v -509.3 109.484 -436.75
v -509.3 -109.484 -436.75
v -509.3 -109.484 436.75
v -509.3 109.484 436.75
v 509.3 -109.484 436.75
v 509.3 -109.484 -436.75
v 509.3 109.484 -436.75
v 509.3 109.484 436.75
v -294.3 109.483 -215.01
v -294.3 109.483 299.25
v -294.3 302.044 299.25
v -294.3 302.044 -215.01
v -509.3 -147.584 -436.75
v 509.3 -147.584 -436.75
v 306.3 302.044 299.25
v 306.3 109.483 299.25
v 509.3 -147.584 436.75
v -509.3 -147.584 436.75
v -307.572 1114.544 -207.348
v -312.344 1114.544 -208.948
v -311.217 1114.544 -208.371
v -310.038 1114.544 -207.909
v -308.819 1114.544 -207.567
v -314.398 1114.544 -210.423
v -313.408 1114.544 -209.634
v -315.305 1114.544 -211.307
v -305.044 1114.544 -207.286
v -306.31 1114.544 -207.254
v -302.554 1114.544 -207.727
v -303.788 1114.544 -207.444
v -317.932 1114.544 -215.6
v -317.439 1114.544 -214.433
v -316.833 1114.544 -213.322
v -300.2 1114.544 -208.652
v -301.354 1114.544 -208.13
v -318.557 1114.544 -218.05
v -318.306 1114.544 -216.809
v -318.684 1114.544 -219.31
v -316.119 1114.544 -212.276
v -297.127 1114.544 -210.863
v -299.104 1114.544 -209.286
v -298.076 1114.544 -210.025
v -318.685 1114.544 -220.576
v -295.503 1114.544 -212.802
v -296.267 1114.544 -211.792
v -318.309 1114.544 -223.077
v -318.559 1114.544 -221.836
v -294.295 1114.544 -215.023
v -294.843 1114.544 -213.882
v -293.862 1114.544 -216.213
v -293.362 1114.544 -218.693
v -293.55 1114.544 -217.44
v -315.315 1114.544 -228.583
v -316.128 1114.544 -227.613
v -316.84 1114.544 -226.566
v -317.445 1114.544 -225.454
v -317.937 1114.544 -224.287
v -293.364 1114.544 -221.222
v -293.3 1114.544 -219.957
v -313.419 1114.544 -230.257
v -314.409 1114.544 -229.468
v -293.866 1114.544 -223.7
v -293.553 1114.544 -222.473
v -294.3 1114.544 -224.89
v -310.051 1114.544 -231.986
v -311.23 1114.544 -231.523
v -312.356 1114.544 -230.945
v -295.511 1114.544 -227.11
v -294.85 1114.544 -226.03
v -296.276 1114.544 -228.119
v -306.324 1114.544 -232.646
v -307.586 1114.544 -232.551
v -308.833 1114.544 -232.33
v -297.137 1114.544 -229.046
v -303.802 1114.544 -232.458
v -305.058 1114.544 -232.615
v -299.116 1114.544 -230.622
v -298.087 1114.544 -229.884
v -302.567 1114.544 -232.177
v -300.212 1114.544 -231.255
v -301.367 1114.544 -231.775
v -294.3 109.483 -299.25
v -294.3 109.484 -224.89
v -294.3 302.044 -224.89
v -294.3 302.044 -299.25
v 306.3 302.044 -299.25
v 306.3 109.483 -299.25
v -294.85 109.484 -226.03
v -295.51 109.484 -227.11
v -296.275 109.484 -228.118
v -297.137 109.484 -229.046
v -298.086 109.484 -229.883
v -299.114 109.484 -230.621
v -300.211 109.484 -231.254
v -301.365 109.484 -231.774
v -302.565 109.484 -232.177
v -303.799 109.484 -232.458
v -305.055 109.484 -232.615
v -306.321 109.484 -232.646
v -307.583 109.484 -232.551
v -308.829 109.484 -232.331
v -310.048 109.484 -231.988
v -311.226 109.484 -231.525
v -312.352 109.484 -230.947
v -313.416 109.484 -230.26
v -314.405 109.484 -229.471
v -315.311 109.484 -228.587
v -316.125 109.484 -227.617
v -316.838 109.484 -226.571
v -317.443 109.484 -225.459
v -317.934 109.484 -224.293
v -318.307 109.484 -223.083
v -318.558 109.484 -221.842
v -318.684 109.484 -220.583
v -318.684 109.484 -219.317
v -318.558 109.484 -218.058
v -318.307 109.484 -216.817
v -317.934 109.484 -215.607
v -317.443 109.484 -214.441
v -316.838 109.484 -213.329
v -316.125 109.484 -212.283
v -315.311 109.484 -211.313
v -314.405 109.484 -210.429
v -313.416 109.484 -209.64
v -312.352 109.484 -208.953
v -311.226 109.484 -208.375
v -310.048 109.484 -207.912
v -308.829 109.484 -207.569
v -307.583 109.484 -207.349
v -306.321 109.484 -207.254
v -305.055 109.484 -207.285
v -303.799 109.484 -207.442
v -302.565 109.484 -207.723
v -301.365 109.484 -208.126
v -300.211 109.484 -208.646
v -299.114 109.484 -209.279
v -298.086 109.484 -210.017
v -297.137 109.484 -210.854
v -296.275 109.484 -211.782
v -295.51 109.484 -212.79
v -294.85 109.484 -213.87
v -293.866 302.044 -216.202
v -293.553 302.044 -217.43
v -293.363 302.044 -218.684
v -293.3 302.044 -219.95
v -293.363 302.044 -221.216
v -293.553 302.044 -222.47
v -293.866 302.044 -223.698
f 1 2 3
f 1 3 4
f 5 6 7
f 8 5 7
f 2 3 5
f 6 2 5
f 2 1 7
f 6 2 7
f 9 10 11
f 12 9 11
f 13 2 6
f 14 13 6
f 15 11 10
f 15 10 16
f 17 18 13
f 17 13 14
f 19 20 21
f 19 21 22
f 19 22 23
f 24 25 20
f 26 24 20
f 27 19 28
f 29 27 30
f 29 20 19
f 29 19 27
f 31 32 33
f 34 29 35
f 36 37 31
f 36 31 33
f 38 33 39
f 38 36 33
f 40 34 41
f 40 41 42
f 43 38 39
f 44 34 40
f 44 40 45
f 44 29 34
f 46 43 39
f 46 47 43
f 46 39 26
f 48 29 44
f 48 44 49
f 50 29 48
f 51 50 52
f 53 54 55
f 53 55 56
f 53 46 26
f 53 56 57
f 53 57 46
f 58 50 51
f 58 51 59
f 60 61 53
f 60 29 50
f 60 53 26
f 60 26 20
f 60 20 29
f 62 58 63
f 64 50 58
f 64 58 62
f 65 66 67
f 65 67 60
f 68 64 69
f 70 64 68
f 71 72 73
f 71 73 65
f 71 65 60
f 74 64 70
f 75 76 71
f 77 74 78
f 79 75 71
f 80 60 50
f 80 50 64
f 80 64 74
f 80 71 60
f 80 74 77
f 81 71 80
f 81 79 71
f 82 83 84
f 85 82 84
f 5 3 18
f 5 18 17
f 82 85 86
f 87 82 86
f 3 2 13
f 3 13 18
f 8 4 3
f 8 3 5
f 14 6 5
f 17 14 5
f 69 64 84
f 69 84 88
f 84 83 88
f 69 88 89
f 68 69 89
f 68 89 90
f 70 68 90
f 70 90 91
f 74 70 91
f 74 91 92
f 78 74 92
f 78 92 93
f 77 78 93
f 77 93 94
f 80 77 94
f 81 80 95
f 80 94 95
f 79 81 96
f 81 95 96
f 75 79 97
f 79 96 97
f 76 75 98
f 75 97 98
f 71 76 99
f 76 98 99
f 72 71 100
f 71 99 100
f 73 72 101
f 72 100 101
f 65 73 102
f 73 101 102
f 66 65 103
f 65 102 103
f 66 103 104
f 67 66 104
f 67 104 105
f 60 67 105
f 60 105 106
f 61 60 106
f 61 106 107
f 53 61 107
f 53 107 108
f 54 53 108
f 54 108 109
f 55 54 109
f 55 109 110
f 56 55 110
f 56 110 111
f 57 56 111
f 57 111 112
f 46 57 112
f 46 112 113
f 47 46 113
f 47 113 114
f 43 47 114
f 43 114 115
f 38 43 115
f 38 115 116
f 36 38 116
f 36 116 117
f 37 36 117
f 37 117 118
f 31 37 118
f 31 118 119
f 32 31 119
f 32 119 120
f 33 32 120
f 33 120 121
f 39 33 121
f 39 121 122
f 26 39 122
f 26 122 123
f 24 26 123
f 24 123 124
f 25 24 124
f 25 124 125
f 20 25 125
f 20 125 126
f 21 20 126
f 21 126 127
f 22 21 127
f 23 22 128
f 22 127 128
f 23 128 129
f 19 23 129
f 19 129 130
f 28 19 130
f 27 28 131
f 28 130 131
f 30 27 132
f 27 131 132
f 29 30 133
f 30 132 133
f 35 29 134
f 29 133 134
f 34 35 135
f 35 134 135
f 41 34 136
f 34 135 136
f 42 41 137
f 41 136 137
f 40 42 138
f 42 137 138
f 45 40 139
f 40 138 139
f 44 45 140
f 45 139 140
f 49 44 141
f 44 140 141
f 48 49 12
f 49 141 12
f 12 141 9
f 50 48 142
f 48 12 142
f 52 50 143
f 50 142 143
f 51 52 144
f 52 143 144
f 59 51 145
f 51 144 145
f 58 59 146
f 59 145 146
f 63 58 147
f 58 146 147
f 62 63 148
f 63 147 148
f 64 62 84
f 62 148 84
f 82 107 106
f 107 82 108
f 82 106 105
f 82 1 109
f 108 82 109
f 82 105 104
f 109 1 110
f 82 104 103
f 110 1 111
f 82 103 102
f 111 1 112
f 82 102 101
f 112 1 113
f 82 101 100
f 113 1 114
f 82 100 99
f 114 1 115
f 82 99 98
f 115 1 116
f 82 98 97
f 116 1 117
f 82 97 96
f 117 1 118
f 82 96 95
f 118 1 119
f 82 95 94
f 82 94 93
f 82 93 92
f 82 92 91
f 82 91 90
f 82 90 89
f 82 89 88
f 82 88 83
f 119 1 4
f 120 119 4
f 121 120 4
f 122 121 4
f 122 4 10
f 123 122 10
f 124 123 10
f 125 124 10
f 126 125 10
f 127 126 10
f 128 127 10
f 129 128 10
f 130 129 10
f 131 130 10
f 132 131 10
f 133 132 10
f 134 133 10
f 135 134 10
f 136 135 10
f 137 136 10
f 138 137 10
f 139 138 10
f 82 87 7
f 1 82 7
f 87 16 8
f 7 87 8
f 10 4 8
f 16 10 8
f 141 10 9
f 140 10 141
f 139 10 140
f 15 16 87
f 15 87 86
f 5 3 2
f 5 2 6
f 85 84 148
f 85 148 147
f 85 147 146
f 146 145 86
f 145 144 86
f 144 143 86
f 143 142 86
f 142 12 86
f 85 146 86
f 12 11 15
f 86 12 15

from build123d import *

# Parameters (mm, degrees)
SKETCH1_W           = 1018.6
SKETCH1_H           = 218.967
BOSS_EXTRUDE1_DEPTH = 436.75
SKETCH2_W           = 600.6
SKETCH2_H           = 192.56
BOSS_EXTRUDE2_DEPTH = 299.25
SKETCH3_R           = 12.7
BOSS_EXTRUDE5_DEPTH = 1005.06
SKETCH4_W           = 1018.6
SKETCH4_H           = 873.5
BOSS_EXTRUDE6_DEPTH = 38.1


with BuildPart() as part:
    # Sketch1 → Boss-Extrude1 (new, symmetric)
    with BuildSketch(Plane.XY):
        Rectangle(SKETCH1_W, SKETCH1_H)
    extrude(amount=BOSS_EXTRUDE1_DEPTH, both=True)

    # Sketch2 → Boss-Extrude2 (add, symmetric)
    with BuildSketch(Plane.XY):
        with Locations((6, 205.7635)):
            Rectangle(SKETCH2_W, SKETCH2_H)
    extrude(amount=BOSS_EXTRUDE2_DEPTH, both=True)

    # Sketch3 → Boss-Extrude5 (add)
    with BuildSketch(Plane(origin=(0, 109.4835, 0), x_dir=(1, 0, 0), z_dir=(0, 1, 0))):
        with Locations(Location((-306, 219.95, 0), (0, 0, 22.889037196))):
            Circle(SKETCH3_R)
    extrude(amount=BOSS_EXTRUDE5_DEPTH)


with BuildPart() as body_2:
    # Sketch4 → Boss-Extrude6 (new body)
    with BuildSketch(Plane.XZ.offset(109.4835)):
        Rectangle(SKETCH4_W, SKETCH4_H)
    extrude(amount=BOSS_EXTRUDE6_DEPTH)


solid = Compound([part.part, body_2.part])
